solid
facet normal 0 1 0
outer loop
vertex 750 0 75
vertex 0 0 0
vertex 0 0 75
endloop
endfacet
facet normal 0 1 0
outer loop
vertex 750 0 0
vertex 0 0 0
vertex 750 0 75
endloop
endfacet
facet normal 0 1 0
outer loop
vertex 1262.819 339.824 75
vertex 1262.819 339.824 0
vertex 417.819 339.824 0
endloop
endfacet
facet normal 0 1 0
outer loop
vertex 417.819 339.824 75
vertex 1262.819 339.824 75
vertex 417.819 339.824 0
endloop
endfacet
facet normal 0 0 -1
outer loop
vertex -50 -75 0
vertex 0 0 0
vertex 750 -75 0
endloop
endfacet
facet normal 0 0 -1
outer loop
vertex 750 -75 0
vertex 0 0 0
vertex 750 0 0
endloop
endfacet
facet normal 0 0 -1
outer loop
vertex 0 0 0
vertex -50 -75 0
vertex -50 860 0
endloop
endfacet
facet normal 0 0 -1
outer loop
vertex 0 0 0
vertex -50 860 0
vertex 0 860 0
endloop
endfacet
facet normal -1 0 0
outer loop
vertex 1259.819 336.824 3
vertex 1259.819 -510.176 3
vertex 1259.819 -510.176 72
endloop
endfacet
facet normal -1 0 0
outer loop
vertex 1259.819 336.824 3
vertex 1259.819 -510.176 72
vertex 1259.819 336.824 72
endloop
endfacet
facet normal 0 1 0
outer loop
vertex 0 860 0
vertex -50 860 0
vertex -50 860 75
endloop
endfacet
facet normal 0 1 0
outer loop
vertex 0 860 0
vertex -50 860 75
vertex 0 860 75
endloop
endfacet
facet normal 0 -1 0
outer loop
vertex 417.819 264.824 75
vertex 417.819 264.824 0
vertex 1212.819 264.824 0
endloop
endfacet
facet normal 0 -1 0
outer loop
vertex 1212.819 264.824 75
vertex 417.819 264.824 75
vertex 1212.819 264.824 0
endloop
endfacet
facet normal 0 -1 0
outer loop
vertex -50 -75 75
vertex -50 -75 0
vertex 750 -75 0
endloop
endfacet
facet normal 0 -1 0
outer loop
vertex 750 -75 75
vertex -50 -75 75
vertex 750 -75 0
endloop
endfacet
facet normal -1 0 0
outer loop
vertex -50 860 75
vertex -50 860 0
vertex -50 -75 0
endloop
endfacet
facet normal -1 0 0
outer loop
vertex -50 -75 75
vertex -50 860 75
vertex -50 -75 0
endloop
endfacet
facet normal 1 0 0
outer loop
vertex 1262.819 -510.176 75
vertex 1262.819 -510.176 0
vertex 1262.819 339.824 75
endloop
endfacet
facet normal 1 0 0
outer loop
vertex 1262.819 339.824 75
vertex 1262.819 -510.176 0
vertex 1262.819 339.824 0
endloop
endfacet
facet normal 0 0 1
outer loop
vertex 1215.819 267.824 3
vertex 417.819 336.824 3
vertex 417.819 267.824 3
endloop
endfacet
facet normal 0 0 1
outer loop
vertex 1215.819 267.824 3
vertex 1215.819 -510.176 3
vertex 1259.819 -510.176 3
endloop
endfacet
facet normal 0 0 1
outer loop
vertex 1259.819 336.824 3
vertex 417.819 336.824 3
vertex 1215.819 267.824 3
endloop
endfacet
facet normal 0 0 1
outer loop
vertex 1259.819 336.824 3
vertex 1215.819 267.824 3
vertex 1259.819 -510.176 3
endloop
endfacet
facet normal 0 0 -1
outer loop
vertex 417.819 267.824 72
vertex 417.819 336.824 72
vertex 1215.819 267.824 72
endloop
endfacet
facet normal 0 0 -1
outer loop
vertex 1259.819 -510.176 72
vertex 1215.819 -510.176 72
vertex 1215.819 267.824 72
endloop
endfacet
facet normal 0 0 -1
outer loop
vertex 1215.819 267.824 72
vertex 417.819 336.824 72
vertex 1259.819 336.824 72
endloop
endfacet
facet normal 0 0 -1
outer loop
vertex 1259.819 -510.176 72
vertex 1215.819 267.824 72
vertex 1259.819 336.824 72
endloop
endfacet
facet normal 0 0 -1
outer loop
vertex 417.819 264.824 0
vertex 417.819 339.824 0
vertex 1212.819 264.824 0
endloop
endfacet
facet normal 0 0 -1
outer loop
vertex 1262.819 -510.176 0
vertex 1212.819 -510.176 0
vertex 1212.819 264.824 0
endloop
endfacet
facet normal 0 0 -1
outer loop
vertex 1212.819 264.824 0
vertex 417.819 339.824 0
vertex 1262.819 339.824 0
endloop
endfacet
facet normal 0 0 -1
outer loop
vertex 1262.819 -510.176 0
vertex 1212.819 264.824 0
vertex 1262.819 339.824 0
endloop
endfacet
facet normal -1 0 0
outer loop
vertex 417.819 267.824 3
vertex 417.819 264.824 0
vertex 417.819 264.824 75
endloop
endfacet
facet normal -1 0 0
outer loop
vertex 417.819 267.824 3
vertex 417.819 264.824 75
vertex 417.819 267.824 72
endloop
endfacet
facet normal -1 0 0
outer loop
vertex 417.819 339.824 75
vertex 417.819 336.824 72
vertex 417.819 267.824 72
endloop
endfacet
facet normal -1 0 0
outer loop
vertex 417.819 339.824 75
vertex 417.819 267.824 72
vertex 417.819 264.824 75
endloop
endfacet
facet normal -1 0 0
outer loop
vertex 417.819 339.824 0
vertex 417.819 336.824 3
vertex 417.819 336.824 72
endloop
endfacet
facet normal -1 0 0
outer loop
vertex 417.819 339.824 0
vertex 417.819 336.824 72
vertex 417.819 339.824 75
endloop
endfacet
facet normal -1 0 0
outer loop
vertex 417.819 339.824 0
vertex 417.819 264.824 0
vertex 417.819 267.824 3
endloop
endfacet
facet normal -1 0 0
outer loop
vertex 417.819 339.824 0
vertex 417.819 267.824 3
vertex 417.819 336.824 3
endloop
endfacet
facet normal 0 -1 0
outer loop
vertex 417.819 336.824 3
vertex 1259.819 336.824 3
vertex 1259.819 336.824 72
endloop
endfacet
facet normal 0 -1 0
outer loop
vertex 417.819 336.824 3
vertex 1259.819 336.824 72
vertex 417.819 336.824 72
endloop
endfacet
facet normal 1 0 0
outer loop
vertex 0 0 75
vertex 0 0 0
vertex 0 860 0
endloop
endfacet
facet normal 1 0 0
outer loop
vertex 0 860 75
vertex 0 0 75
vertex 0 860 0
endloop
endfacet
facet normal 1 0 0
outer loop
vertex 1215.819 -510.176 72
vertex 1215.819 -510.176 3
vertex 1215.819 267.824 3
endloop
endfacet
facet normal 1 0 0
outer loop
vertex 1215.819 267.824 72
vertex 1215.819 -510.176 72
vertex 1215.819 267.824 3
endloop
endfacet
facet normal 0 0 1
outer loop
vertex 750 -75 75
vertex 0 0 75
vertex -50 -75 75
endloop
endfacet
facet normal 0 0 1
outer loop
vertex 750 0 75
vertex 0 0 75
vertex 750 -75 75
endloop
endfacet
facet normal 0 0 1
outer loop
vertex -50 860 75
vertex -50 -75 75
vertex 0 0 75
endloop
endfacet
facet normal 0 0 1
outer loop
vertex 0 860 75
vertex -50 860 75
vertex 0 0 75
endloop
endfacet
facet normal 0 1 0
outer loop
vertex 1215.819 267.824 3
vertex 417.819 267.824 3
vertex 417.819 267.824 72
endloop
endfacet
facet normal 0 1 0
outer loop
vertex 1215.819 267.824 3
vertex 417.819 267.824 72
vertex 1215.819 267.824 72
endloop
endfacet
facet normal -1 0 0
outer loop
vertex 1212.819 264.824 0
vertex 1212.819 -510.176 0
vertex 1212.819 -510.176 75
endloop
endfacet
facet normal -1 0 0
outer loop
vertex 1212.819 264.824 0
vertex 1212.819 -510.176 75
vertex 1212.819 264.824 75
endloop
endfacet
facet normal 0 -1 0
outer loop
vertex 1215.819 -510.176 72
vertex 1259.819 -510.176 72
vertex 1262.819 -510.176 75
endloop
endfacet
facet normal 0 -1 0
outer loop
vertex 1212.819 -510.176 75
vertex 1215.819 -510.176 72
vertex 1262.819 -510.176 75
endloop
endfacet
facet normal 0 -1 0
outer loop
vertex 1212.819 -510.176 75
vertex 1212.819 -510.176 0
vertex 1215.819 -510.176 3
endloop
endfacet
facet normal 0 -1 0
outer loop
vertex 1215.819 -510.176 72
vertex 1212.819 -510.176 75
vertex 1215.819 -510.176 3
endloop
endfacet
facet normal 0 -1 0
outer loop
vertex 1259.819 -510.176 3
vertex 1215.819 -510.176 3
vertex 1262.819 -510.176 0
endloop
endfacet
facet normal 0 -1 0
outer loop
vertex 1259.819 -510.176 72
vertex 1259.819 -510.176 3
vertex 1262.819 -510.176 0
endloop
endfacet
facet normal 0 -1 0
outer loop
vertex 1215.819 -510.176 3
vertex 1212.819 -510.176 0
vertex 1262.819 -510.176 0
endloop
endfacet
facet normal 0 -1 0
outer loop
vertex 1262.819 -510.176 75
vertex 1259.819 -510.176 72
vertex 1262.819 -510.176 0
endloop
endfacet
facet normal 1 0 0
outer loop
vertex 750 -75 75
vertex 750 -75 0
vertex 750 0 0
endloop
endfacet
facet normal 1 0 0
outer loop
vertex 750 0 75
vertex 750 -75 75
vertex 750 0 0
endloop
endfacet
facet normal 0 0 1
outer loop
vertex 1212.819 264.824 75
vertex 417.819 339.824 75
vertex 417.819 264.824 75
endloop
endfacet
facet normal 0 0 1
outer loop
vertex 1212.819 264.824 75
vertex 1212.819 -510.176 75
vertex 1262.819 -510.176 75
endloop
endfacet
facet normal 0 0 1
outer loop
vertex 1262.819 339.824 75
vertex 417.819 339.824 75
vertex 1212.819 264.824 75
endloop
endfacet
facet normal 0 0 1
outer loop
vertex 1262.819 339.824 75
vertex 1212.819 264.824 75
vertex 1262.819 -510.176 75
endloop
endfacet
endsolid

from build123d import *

# Parameters (mm, degrees)
F0_W     = 750
F0_H     = 75
F0_W_2   = 50
F0_H_2   = 860
F1_DEPTH = 75
F2_T     = -3
F3_DEPTH = 75
F0_W_3   = 795
F0_H_3   = 775
F4_T     = -3


with BuildPart() as f1:
    # F0 (on Top) → F1 (new body)
    with BuildSketch(Plane.XY):
        with Locations((375, -37.5)):
            Rectangle(F0_W, F0_H)
        with Locations((-25, 430)):
            Rectangle(F0_W_2, F0_H_2)
        with Locations((-25, -37.5)):
            Rectangle(F0_W_2, F0_H)
    extrude(amount=F1_DEPTH)

    # F2
    f2_openings = [f1.faces().sort_by_distance(p)[0] for p in [
        (750, -37.5, 37.5),
        (-25, 860, 37.5),
    ]]
    offset(amount=F2_T, openings=f2_openings, kind=Kind.INTERSECTION)

    # F0 (on Top) → F3 (join)
    with BuildSketch(Plane.XY):
        with Locations((375, -37.5)):
            Rectangle(F0_W, F0_H)
        with Locations((-25, -37.5)):
            Rectangle(F0_W_2, F0_H)
        with Locations((-25, 430)):
            Rectangle(F0_W_2, F0_H_2)
    extrude(amount=F3_DEPTH)


with BuildPart() as f3:
    # F0 (on Top) → F3, piece 2 (new body)
    with BuildSketch(Plane.XY):
        with Locations((815.3189337254, 302.3237943649)):
            Rectangle(F0_W_3, F0_H)
        with Locations((1237.8189337254, 302.3237943649)):
            Rectangle(F0_W_2, F0_H)
        with Locations((1237.8189337254, -122.6762056351)):
            Rectangle(F0_W_2, F0_H_3)
    extrude(amount=F3_DEPTH)

    # F4
    f4_openings = [f3.faces().sort_by_distance(p)[0] for p in [
        (417.818934, 302.323794, 37.5),
        (1237.818934, -510.176206, 37.5),
    ]]
    offset(amount=F4_T, openings=f4_openings, kind=Kind.INTERSECTION)


solid = Compound([f1.part, f3.part])
